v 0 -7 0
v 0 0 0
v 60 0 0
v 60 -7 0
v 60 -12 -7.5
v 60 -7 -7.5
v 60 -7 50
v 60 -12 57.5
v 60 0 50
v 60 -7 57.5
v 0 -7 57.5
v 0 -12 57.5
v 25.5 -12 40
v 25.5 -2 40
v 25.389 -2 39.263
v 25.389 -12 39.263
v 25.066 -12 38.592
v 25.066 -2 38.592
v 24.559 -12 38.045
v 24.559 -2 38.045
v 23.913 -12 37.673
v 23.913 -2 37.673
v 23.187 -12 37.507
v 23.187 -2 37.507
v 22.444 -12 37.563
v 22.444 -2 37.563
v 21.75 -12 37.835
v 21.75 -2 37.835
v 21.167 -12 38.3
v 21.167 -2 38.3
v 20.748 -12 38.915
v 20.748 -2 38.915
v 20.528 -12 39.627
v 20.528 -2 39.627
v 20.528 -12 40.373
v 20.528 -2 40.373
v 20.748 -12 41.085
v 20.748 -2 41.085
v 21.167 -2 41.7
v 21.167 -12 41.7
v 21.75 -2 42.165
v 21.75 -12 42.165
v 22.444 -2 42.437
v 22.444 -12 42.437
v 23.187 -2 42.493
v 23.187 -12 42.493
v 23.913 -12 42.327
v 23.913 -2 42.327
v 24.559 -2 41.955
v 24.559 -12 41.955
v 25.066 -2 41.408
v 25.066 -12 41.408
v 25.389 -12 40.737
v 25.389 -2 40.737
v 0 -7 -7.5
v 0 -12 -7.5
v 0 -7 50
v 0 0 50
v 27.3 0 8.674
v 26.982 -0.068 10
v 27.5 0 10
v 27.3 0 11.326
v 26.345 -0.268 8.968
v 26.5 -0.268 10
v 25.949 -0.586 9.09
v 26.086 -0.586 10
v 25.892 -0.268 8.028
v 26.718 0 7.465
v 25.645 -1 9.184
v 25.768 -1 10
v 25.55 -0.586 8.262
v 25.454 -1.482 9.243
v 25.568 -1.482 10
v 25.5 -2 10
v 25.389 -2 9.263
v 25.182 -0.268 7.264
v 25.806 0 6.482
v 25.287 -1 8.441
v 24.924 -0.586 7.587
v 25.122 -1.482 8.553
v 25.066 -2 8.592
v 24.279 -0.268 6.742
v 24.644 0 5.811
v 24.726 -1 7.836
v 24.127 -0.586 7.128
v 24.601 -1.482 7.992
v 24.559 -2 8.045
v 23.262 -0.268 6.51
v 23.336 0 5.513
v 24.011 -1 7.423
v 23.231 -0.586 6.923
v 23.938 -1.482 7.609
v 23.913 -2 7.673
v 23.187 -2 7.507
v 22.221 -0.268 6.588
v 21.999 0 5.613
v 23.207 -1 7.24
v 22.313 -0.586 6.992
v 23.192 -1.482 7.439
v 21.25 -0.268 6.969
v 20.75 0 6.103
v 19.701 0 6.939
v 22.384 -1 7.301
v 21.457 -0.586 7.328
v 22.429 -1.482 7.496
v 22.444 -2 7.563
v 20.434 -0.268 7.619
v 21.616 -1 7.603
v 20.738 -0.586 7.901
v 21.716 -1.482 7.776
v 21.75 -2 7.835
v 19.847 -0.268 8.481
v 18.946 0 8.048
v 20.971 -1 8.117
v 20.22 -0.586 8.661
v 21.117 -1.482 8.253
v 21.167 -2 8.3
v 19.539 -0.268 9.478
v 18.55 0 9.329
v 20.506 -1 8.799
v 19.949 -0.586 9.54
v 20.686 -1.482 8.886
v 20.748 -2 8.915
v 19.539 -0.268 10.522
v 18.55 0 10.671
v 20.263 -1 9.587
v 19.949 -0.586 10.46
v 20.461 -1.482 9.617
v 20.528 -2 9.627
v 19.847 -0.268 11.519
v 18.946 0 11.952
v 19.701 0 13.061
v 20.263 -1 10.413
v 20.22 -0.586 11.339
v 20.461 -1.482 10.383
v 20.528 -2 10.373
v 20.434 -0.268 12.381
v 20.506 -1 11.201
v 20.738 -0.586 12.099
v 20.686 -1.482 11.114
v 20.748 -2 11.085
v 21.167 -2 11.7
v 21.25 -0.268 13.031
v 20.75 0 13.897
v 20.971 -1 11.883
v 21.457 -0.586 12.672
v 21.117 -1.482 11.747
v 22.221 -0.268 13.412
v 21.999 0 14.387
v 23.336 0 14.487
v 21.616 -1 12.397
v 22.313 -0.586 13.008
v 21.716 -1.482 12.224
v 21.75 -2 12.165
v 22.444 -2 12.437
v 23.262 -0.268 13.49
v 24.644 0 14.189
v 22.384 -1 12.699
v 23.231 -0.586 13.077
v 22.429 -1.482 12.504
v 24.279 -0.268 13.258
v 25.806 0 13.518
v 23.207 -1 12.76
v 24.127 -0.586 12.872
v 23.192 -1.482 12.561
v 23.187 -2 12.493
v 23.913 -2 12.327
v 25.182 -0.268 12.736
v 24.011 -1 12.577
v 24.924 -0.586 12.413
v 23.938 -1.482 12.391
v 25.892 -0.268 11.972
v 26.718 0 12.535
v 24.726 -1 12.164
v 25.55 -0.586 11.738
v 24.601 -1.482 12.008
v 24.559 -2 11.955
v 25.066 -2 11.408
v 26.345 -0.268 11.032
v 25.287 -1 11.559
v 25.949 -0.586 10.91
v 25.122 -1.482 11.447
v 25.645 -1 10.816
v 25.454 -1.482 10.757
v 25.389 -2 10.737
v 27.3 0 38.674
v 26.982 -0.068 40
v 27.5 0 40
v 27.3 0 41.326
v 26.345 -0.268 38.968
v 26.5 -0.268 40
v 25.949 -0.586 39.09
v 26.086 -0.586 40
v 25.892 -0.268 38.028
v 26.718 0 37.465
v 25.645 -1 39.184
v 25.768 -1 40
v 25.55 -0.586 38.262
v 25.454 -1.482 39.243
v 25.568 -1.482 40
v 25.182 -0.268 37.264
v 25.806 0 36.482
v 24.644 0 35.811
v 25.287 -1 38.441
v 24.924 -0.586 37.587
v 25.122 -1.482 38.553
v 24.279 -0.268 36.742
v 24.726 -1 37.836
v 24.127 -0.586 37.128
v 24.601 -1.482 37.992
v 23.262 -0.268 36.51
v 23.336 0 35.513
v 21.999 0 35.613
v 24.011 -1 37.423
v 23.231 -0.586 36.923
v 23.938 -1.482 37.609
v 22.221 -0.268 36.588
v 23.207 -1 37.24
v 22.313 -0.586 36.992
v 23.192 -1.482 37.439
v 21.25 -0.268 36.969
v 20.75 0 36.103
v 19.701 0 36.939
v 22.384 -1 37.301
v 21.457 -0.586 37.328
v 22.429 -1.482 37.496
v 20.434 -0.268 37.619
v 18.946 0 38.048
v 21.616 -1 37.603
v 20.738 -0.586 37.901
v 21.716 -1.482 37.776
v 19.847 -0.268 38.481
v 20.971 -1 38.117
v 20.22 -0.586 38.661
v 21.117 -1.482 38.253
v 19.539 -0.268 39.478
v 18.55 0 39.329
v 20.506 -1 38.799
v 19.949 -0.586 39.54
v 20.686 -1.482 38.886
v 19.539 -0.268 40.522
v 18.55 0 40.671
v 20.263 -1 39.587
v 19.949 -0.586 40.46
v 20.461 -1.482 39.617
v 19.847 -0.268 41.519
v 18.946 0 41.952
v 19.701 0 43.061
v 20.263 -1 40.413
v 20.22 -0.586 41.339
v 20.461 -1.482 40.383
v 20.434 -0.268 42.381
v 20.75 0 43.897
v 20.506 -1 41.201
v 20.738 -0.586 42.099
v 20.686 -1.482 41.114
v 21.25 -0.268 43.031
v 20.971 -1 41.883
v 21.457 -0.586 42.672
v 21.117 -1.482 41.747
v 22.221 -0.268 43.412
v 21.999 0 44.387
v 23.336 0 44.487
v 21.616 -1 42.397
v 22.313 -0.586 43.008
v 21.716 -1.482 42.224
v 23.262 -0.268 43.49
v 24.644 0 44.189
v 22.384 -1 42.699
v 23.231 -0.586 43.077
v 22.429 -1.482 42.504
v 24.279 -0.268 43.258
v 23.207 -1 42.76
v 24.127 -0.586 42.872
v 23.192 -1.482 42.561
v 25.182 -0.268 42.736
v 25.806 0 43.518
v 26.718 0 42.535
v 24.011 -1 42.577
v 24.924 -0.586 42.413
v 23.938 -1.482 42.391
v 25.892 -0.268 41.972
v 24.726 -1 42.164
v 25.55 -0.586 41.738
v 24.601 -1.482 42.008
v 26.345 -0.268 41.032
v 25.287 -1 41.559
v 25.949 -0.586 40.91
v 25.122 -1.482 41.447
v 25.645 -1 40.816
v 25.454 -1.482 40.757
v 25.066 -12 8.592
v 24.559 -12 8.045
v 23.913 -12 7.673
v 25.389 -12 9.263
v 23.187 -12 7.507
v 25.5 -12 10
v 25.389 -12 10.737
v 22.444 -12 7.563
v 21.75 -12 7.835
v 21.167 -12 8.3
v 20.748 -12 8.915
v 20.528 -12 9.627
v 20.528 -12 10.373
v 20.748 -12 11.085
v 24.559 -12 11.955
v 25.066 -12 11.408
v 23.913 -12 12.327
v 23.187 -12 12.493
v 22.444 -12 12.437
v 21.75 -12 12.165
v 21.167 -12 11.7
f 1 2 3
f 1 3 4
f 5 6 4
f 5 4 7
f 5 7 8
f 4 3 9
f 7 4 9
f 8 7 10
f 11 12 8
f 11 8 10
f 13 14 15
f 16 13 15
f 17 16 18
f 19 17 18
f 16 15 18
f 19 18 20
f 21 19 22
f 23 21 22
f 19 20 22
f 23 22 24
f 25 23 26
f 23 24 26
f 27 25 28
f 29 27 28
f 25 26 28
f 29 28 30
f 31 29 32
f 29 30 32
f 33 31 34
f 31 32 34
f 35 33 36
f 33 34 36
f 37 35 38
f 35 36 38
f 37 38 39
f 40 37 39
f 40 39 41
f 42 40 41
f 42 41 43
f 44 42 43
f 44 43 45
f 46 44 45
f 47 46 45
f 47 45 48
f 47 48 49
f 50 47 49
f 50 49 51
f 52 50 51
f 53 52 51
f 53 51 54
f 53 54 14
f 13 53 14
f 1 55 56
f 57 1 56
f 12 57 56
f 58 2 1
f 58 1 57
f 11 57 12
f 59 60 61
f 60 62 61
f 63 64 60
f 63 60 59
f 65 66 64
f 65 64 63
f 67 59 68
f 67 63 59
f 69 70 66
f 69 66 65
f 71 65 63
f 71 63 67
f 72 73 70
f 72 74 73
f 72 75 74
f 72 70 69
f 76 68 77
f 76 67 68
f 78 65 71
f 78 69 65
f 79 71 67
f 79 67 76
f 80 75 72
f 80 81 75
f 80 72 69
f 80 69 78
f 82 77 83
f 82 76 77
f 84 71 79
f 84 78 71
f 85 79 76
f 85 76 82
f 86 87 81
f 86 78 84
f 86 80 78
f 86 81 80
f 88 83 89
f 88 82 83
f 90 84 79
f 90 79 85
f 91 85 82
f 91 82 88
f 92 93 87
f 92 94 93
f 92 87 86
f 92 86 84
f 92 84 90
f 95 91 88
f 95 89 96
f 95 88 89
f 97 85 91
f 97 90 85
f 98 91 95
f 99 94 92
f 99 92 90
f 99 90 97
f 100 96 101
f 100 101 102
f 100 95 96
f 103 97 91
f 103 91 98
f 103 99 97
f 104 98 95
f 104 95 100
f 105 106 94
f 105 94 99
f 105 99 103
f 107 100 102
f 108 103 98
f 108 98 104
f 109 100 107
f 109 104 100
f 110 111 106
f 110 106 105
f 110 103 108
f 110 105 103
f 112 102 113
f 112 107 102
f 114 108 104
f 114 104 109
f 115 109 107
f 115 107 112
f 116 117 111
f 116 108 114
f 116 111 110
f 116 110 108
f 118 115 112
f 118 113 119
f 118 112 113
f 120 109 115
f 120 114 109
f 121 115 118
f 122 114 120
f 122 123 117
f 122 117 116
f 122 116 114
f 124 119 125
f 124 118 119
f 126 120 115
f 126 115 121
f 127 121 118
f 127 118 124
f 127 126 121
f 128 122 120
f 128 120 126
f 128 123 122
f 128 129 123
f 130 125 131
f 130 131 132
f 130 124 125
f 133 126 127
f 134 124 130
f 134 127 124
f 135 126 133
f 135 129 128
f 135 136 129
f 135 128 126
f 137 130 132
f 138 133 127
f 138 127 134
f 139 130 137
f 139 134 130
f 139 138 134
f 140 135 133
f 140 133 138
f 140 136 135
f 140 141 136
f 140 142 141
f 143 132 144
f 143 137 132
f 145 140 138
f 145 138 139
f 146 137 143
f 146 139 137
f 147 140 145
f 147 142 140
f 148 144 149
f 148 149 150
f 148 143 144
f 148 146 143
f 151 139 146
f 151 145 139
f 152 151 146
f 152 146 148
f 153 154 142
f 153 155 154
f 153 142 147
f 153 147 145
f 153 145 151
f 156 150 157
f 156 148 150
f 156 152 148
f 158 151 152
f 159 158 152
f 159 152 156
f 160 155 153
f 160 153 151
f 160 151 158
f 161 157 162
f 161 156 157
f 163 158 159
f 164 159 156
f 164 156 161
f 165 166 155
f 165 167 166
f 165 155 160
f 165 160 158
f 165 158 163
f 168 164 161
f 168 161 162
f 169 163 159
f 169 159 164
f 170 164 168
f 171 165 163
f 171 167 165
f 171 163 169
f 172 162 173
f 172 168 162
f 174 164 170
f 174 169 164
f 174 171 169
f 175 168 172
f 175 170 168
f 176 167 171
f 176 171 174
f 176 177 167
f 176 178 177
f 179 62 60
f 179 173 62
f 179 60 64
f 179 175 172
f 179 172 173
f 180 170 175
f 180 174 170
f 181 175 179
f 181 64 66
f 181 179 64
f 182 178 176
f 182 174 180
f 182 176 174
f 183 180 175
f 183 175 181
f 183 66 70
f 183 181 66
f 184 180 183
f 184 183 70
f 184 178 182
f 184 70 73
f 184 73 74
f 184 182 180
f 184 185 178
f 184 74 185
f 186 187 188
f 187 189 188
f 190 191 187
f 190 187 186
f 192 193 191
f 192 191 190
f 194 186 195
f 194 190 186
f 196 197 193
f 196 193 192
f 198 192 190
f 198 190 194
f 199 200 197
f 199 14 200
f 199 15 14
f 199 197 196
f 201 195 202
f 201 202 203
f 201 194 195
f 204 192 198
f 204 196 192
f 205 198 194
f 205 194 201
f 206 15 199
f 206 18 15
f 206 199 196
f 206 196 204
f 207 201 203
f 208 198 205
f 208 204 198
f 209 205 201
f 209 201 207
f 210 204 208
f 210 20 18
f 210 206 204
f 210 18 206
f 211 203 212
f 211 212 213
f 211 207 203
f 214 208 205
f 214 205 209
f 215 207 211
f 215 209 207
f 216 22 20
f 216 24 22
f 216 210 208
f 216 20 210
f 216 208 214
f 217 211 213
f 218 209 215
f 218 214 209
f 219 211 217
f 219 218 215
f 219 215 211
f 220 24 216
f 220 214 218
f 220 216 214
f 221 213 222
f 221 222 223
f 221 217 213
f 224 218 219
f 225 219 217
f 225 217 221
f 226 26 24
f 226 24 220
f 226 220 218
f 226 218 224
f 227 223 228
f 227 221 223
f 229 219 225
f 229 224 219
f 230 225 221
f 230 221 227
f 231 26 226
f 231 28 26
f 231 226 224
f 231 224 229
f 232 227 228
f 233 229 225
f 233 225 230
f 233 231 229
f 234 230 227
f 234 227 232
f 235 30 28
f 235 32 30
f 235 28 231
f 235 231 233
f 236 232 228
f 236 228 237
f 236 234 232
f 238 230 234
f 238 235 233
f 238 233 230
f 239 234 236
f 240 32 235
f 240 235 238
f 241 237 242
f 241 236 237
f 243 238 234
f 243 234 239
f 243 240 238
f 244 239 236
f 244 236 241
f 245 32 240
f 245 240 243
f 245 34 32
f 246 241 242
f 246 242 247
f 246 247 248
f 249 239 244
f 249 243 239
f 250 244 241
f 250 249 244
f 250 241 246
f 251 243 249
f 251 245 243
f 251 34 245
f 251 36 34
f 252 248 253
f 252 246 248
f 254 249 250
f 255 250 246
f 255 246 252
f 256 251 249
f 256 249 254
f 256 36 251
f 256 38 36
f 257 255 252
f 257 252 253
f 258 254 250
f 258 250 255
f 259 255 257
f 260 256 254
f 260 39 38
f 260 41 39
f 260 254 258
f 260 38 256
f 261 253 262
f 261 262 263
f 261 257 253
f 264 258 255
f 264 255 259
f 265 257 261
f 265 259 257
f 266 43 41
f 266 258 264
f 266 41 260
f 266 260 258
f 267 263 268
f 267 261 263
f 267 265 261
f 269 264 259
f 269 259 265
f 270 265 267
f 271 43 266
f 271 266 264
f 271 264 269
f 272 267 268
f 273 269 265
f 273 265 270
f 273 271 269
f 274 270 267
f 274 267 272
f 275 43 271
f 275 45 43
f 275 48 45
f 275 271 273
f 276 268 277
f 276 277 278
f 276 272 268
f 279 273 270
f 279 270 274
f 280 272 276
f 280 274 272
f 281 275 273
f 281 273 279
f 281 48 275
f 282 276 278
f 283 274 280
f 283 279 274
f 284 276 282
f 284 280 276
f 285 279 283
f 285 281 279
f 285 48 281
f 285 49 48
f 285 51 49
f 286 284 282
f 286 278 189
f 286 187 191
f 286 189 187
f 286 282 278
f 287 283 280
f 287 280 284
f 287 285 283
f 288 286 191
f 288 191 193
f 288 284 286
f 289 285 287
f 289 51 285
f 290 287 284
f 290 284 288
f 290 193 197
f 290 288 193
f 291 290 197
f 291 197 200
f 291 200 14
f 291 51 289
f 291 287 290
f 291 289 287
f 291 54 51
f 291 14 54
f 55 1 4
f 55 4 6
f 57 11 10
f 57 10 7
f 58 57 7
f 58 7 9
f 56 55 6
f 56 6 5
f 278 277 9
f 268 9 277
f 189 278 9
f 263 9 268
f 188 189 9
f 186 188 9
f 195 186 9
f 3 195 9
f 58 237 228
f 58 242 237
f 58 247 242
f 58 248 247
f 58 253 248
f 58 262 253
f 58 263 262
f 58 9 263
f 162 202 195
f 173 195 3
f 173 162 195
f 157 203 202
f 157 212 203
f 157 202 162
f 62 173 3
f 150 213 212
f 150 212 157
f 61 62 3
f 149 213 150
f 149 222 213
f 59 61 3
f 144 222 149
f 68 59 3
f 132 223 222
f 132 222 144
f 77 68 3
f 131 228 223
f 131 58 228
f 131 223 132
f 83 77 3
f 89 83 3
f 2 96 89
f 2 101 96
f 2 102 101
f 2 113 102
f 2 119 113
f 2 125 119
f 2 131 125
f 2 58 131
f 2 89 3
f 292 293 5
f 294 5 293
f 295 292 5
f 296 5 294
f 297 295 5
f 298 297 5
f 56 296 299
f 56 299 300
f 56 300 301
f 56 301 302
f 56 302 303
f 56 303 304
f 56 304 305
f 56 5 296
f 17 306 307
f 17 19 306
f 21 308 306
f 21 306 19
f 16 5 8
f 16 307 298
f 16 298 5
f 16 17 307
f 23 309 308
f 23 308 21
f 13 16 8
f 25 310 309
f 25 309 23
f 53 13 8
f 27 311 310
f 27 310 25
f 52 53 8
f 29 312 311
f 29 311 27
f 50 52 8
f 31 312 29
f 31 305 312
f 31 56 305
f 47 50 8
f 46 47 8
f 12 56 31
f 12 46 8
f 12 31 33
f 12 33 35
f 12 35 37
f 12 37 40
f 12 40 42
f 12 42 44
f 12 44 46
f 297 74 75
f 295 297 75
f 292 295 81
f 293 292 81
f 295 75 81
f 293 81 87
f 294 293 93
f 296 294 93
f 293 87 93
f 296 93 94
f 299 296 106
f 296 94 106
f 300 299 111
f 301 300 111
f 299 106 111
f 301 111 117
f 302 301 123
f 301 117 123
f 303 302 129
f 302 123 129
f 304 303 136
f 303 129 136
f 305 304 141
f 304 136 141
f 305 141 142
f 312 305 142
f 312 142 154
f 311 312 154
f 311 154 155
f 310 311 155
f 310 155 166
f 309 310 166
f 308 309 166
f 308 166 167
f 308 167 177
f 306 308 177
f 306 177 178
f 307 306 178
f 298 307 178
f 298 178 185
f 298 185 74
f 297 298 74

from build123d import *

# Parameters (mm, degrees)
BOSS_EXTRUDE1_DEPTH     = 60
SKETCH2_R               = 2.5
CUT_EXTRUDE1_DEPTH      = 1
CUT_EXTRUDE1_DEPTH_BACK = 13
FILLET1_R               = 2


with BuildPart() as part:
    # Sketch1 → Boss-Extrude1 (new body)
    with BuildSketch(Plane(origin=(0, 0, 0), x_dir=(0, 0, -1), z_dir=(1, 0, 0))):
        Polygon((-50, 0), (0, 0), (0, -7), (7.5, -7), (7.5, -12), (-57.5, -12), (-57.5, -7), (-50, -7), align=None)
    extrude(amount=BOSS_EXTRUDE1_DEPTH)

    # Sketch2 → Cut-Extrude1 (cut, two sides)
    with BuildSketch(Plane(origin=(0, 0, 0), x_dir=(1, 0, 0), z_dir=(0, 1, 0))) as cut_extrude1_sk:
        with Locations((23, -10)):
            Circle(SKETCH2_R)
        with Locations((23, -40)):
            Circle(SKETCH2_R)
    extrude(amount=CUT_EXTRUDE1_DEPTH, mode=Mode.SUBTRACT)
    extrude(cut_extrude1_sk.sketch, amount=-CUT_EXTRUDE1_DEPTH_BACK, mode=Mode.SUBTRACT)

    # Fillet1
    fillet1_edges = [part.edges().sort_by_distance(p)[0] for p in [
        (20.5, 0, 10),
        (20.5, 0, 40),
    ]]
    fillet(fillet1_edges, radius=FILLET1_R)


solid = part.part
